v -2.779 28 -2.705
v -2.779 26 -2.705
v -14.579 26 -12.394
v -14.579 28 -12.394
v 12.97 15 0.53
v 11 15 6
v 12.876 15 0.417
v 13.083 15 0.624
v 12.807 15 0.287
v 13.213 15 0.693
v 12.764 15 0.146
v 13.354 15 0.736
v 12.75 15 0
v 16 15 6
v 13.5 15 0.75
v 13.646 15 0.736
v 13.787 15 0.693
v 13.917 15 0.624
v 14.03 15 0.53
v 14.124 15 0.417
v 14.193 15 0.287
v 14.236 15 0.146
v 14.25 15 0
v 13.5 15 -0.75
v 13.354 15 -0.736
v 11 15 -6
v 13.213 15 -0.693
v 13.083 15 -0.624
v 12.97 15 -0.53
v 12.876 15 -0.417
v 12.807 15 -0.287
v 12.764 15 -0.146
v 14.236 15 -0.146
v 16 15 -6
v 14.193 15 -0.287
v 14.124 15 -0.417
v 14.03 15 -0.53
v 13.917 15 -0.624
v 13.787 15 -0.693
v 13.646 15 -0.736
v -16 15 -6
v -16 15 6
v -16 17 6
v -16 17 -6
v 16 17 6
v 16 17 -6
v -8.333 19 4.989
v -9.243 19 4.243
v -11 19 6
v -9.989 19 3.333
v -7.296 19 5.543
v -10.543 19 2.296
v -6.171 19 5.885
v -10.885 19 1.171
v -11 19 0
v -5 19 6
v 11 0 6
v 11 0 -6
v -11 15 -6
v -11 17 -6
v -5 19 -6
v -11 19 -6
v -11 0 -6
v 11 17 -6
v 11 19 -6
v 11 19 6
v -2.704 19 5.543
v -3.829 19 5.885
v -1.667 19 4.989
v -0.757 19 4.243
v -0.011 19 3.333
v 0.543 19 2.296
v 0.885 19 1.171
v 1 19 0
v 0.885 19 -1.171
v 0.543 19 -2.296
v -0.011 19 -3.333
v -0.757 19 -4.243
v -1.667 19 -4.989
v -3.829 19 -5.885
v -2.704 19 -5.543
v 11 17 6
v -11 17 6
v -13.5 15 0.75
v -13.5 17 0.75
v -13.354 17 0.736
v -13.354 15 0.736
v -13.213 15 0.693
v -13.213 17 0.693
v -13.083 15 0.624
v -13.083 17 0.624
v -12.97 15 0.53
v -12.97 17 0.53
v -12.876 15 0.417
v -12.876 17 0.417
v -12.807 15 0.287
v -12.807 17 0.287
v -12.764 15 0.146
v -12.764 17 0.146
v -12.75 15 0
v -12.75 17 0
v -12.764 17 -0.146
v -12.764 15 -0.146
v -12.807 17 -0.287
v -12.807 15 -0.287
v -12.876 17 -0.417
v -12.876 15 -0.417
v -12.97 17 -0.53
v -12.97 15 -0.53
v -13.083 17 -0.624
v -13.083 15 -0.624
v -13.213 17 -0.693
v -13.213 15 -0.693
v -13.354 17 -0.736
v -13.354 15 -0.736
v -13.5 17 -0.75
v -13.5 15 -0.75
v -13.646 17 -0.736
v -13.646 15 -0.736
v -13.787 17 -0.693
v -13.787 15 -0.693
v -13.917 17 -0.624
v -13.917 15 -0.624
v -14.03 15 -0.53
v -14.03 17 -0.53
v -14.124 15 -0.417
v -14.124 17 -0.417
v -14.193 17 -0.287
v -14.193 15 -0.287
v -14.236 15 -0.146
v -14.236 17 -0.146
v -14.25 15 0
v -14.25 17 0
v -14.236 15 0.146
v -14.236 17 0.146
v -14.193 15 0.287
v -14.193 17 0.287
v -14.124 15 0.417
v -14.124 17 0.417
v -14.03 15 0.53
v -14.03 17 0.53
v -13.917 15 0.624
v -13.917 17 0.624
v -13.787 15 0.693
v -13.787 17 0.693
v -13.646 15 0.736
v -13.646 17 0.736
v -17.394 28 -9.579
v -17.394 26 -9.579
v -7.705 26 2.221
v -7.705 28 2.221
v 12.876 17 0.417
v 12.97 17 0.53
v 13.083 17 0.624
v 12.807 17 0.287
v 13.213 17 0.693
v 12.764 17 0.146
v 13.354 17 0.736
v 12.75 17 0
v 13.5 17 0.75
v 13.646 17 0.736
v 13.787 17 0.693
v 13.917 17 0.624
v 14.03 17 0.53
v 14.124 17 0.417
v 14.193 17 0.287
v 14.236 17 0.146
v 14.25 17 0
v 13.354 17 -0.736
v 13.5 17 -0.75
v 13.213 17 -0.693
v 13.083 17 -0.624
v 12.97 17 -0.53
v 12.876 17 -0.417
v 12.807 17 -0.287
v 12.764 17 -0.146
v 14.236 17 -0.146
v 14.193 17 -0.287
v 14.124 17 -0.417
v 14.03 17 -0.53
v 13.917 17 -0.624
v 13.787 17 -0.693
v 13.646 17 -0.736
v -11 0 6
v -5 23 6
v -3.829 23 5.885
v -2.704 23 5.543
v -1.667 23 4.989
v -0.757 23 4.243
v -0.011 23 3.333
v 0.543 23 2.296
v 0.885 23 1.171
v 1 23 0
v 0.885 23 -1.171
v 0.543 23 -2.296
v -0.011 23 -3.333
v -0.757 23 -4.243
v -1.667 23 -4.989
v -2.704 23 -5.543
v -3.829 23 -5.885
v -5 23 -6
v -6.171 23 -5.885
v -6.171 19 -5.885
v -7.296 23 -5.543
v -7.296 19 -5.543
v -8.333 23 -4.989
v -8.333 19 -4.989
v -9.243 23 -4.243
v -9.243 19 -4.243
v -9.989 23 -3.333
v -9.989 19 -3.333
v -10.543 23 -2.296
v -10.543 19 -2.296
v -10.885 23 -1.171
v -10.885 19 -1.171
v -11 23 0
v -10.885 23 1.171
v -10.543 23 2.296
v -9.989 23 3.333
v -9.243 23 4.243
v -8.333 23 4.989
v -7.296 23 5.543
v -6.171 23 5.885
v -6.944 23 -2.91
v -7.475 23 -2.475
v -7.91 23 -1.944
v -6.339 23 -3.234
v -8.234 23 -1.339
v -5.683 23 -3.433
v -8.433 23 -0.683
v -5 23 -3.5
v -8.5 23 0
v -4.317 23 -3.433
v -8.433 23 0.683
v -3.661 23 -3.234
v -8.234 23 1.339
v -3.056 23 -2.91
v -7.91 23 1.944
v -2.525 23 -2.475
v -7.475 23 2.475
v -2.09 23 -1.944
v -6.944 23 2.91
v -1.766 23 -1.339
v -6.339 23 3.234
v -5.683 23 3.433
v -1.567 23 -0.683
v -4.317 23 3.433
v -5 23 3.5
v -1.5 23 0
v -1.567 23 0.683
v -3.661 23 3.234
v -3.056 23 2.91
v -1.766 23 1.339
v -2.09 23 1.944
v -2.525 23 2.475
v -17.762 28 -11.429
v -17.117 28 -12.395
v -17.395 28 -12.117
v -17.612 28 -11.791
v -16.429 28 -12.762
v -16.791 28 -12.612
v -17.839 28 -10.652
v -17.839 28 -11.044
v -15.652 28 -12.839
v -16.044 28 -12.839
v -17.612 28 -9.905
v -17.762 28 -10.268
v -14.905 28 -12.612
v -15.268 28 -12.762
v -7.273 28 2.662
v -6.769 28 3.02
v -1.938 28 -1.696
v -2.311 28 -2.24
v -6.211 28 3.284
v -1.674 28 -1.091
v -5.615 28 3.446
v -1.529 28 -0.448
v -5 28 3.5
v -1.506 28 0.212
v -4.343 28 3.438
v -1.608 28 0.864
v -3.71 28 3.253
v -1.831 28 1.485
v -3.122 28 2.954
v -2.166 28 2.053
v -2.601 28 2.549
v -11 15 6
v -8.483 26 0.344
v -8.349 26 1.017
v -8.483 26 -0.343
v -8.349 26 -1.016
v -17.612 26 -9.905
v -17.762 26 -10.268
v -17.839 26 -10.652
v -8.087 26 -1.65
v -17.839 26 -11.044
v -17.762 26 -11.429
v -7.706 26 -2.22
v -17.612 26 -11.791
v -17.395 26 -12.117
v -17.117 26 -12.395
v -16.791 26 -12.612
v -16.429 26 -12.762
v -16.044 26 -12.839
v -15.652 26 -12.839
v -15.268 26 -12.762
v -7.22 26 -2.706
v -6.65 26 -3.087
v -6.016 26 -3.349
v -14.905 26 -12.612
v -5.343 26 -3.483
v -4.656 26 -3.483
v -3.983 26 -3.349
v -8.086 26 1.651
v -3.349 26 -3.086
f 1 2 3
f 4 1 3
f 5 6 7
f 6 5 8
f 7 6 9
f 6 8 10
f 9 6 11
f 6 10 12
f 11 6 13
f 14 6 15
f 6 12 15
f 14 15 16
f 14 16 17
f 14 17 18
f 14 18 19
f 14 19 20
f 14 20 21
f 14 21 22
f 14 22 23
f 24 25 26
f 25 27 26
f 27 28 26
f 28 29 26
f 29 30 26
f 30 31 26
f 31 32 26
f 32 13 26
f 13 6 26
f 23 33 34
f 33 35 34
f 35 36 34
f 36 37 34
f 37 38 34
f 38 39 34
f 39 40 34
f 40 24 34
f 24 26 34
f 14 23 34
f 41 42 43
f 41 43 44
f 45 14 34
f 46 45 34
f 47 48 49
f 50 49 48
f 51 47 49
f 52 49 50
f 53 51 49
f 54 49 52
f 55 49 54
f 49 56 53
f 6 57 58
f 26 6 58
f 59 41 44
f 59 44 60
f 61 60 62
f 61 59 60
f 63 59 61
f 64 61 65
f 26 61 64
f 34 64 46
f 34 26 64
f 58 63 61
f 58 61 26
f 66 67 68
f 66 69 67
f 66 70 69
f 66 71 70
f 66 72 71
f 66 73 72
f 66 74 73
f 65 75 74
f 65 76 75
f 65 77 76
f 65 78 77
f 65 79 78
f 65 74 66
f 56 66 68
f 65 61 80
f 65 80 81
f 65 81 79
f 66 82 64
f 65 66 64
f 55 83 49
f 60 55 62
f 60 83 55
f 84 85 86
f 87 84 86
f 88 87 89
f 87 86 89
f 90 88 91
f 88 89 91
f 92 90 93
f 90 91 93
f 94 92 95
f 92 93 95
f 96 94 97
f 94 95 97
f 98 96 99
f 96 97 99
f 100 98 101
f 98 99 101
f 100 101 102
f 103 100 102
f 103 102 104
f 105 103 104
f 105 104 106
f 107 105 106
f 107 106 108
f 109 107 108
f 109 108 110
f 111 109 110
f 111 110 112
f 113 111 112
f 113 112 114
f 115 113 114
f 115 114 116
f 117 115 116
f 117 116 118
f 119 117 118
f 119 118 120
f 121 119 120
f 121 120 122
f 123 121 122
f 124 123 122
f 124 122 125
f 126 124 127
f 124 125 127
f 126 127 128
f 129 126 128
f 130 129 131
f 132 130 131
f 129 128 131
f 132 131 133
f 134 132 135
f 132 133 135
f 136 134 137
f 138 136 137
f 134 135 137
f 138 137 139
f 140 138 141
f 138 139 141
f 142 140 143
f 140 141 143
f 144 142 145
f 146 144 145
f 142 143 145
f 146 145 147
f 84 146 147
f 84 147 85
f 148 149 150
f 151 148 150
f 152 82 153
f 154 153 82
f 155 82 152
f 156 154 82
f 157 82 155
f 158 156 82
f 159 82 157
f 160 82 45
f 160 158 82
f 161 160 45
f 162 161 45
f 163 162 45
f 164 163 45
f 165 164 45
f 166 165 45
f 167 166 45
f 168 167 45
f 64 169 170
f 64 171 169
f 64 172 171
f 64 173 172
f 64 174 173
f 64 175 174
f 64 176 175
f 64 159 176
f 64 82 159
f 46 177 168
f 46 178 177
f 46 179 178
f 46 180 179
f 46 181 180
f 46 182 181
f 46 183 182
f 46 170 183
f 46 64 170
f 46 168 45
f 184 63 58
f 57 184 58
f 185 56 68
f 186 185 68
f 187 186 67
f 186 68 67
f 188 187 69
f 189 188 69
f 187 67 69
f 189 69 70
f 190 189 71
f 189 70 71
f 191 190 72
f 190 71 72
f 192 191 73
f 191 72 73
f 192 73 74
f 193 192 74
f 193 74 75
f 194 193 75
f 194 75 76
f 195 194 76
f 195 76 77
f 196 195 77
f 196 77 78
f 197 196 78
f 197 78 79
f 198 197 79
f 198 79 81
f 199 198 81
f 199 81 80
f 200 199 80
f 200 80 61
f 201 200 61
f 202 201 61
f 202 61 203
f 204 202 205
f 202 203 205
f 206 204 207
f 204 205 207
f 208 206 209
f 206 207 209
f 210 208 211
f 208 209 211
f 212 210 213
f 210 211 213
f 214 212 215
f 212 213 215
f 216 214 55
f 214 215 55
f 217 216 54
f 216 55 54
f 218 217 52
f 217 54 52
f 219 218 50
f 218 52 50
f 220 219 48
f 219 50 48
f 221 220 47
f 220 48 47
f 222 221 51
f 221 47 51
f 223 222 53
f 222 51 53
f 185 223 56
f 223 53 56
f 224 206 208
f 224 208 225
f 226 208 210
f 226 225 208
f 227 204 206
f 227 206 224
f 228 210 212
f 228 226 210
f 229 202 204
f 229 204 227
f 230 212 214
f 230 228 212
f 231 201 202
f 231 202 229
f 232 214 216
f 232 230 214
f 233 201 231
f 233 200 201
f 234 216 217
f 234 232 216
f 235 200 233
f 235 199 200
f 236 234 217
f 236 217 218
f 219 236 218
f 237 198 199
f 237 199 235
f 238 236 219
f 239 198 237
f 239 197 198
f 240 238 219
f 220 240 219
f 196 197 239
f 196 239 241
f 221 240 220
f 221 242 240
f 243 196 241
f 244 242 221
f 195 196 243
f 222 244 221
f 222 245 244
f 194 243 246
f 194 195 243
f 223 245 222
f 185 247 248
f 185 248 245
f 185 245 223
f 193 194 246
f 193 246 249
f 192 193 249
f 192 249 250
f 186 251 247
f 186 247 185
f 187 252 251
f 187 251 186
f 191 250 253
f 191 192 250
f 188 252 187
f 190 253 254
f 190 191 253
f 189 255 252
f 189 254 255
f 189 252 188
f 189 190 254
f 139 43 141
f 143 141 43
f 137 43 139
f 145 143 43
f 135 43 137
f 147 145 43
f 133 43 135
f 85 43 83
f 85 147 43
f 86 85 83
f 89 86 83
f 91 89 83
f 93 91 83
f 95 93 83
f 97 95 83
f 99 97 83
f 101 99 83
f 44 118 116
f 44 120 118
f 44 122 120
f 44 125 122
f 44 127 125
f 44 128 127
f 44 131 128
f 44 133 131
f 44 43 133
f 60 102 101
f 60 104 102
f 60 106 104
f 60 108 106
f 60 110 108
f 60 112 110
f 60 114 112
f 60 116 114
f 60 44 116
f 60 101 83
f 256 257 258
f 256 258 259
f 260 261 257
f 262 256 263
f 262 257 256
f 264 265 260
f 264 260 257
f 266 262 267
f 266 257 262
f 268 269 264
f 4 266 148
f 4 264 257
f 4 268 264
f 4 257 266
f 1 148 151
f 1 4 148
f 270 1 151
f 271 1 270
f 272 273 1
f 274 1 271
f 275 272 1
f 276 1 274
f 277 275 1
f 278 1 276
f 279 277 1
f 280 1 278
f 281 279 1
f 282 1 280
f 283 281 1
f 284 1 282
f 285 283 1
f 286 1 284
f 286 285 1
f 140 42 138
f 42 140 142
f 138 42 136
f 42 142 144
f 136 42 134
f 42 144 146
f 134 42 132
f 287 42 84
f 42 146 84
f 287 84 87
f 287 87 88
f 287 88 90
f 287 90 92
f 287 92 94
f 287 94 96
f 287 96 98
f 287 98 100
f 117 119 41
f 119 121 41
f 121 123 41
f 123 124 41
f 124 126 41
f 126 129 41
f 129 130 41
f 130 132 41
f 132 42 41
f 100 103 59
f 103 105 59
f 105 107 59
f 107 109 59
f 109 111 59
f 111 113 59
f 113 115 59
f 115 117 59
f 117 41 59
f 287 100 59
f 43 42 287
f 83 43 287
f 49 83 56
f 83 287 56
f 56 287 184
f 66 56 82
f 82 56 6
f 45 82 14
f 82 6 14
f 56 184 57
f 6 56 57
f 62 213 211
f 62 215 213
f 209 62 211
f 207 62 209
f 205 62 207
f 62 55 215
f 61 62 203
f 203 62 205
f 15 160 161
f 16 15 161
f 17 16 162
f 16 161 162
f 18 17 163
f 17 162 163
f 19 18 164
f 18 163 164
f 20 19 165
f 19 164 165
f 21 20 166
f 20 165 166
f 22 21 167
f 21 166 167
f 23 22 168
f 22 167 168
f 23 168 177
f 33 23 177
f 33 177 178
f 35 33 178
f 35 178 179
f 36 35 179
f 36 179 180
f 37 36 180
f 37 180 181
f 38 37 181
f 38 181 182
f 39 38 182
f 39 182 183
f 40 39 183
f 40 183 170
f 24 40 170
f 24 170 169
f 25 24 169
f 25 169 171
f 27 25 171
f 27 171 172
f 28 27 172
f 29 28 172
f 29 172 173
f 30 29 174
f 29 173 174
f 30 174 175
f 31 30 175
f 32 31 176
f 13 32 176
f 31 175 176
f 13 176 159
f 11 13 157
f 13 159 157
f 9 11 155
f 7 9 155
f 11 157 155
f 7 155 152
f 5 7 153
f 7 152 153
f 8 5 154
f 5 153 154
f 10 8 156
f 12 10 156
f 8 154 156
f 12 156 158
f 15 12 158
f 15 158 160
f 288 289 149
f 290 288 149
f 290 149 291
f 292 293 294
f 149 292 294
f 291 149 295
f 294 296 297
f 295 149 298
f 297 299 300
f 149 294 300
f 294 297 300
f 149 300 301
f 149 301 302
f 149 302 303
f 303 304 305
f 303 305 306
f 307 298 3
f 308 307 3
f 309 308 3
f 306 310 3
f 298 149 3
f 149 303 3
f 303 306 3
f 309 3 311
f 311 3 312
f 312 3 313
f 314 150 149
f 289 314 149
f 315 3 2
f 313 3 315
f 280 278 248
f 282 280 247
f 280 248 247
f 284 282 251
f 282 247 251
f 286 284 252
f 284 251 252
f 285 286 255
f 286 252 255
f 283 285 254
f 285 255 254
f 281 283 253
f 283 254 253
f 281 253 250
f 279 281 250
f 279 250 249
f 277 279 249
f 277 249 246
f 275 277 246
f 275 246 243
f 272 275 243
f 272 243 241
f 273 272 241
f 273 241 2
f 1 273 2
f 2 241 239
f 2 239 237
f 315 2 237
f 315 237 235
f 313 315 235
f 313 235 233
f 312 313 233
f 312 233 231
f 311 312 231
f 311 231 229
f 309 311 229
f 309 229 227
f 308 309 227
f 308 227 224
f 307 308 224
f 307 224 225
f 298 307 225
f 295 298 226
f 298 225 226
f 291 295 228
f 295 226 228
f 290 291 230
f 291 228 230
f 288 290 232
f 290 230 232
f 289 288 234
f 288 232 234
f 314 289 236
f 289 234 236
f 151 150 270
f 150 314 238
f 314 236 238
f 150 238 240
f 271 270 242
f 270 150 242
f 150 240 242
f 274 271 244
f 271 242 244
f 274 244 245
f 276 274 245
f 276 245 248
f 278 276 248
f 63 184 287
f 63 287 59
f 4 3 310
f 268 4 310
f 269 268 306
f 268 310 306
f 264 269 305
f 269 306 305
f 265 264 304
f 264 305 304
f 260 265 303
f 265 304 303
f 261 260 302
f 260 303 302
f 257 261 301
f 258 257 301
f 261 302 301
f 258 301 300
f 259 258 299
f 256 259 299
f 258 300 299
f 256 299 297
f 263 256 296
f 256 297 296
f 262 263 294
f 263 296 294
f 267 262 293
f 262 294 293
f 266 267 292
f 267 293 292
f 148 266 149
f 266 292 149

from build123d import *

# Parameters (mm, degrees)
SKETCH1_W           = 22
SKETCH1_H           = 12
BOSS_EXTRUDE1_DEPTH = 15
SKETCH2_W           = 32
SKETCH2_H           = 12
BOSS_EXTRUDE2_DEPTH = 2
SKETCH4_W           = 22
SKETCH4_H           = 12
BOSS_EXTRUDE3_DEPTH = 2
SKETCH5_R           = 6
BOSS_EXTRUDE4_DEPTH = 4
SKETCH6_R           = 3.5
BOSS_EXTRUDE5_DEPTH = 5
BOSS_EXTRUDE6_START = -2
BOSS_EXTRUDE6_DEPTH = 2
CUT_EXTRUDE1_REACH  = 29.797
SKETCH8_R           = 0.75


with BuildPart() as part:
    # Sketch1 → Boss-Extrude1 (new body)
    with BuildSketch(Plane(origin=(0, 0, 0), x_dir=(1, 0, 0), z_dir=(0, 1, 0))):
        Rectangle(SKETCH1_W, SKETCH1_H)
    extrude(amount=BOSS_EXTRUDE1_DEPTH)

    # Sketch2 → Boss-Extrude2 (add)
    with BuildSketch(Plane(origin=(0, 15, 0), x_dir=(1, 0, 0), z_dir=(0, 1, 0))):
        Rectangle(SKETCH2_W, SKETCH2_H)
    extrude(amount=BOSS_EXTRUDE2_DEPTH)

    # Sketch4 → Boss-Extrude3 (add)
    with BuildSketch(Plane(origin=(0, 17, 0), x_dir=(1, 0, 0), z_dir=(0, 1, 0))):
        Rectangle(SKETCH4_W, SKETCH4_H)
    extrude(amount=BOSS_EXTRUDE3_DEPTH)

    # Sketch5 → Boss-Extrude4 (add)
    with BuildSketch(Plane(origin=(0, 19, 0), x_dir=(1, 0, 0), z_dir=(0, 1, 0))):
        with Locations(Location((-5, 0, 0), (0, 0, 270))):
            Circle(SKETCH5_R)
    extrude(amount=BOSS_EXTRUDE4_DEPTH)

    # Sketch6 → Boss-Extrude5 (add)
    with BuildSketch(Plane(origin=(0, 23, 0), x_dir=(1, 0, 0), z_dir=(0, 1, 0))):
        with Locations(Location((-5, 0, 0), (0, 0, 270))):
            Circle(SKETCH6_R)
    extrude(amount=BOSS_EXTRUDE5_DEPTH)

    # Sketch7 → Boss-Extrude6 (add)
    with BuildSketch(Plane(origin=(0, 28, 0), x_dir=(1, 0, 0), z_dir=(0, 1, 0)).offset(BOSS_EXTRUDE6_START)):
        with BuildLine():
            Line((-17.394274369, 9.57939802), (-7.704984199, -2.22104941))
            ThreePointArc((-7.704984199, -2.22104941), (-7.474873734, 2.474873734), (-2.77895059, 2.704984199))
            Line((-2.77895059, 2.704984199), (-14.57939802, 12.394274369))
            ThreePointArc((-14.57939802, 12.394274369), (-17.262782674, 12.262782674), (-17.394274369, 9.57939802))
        make_face()
    extrude(amount=BOSS_EXTRUDE6_DEPTH)

    # Sketch8 → Cut-Extrude1 (cut, up to next)
    with BuildSketch(Plane(origin=(0, 17, 0), x_dir=(1, 0, 0), z_dir=(0, 1, 0)), mode=Mode.PRIVATE) as cut_extrude1_sk1:
        with Locations(Location((13.5, 0, 0), (0, 0, 270))):
            Circle(SKETCH8_R)
    cut_extrude1_tool1 = extrude(cut_extrude1_sk1.sketch, amount=-CUT_EXTRUDE1_REACH, mode=Mode.PRIVATE) & part.part
    # Sketch8 → Cut-Extrude1 (cut, up to next)
    with BuildSketch(Plane(origin=(0, 17, 0), x_dir=(1, 0, 0), z_dir=(0, 1, 0)), mode=Mode.PRIVATE) as cut_extrude1_sk2:
        with Locations(Location((-13.5, 0, 0), (0, 0, 270))):
            Circle(SKETCH8_R)
    cut_extrude1_tool2 = extrude(cut_extrude1_sk2.sketch, amount=-CUT_EXTRUDE1_REACH, mode=Mode.PRIVATE) & part.part
    add(cut_extrude1_tool1.solids().sort_by_distance((13.5, 17, 0))[0], mode=Mode.SUBTRACT)
    add(cut_extrude1_tool2.solids().sort_by_distance((-13.5, 17, 0))[0], mode=Mode.SUBTRACT)


solid = part.part
